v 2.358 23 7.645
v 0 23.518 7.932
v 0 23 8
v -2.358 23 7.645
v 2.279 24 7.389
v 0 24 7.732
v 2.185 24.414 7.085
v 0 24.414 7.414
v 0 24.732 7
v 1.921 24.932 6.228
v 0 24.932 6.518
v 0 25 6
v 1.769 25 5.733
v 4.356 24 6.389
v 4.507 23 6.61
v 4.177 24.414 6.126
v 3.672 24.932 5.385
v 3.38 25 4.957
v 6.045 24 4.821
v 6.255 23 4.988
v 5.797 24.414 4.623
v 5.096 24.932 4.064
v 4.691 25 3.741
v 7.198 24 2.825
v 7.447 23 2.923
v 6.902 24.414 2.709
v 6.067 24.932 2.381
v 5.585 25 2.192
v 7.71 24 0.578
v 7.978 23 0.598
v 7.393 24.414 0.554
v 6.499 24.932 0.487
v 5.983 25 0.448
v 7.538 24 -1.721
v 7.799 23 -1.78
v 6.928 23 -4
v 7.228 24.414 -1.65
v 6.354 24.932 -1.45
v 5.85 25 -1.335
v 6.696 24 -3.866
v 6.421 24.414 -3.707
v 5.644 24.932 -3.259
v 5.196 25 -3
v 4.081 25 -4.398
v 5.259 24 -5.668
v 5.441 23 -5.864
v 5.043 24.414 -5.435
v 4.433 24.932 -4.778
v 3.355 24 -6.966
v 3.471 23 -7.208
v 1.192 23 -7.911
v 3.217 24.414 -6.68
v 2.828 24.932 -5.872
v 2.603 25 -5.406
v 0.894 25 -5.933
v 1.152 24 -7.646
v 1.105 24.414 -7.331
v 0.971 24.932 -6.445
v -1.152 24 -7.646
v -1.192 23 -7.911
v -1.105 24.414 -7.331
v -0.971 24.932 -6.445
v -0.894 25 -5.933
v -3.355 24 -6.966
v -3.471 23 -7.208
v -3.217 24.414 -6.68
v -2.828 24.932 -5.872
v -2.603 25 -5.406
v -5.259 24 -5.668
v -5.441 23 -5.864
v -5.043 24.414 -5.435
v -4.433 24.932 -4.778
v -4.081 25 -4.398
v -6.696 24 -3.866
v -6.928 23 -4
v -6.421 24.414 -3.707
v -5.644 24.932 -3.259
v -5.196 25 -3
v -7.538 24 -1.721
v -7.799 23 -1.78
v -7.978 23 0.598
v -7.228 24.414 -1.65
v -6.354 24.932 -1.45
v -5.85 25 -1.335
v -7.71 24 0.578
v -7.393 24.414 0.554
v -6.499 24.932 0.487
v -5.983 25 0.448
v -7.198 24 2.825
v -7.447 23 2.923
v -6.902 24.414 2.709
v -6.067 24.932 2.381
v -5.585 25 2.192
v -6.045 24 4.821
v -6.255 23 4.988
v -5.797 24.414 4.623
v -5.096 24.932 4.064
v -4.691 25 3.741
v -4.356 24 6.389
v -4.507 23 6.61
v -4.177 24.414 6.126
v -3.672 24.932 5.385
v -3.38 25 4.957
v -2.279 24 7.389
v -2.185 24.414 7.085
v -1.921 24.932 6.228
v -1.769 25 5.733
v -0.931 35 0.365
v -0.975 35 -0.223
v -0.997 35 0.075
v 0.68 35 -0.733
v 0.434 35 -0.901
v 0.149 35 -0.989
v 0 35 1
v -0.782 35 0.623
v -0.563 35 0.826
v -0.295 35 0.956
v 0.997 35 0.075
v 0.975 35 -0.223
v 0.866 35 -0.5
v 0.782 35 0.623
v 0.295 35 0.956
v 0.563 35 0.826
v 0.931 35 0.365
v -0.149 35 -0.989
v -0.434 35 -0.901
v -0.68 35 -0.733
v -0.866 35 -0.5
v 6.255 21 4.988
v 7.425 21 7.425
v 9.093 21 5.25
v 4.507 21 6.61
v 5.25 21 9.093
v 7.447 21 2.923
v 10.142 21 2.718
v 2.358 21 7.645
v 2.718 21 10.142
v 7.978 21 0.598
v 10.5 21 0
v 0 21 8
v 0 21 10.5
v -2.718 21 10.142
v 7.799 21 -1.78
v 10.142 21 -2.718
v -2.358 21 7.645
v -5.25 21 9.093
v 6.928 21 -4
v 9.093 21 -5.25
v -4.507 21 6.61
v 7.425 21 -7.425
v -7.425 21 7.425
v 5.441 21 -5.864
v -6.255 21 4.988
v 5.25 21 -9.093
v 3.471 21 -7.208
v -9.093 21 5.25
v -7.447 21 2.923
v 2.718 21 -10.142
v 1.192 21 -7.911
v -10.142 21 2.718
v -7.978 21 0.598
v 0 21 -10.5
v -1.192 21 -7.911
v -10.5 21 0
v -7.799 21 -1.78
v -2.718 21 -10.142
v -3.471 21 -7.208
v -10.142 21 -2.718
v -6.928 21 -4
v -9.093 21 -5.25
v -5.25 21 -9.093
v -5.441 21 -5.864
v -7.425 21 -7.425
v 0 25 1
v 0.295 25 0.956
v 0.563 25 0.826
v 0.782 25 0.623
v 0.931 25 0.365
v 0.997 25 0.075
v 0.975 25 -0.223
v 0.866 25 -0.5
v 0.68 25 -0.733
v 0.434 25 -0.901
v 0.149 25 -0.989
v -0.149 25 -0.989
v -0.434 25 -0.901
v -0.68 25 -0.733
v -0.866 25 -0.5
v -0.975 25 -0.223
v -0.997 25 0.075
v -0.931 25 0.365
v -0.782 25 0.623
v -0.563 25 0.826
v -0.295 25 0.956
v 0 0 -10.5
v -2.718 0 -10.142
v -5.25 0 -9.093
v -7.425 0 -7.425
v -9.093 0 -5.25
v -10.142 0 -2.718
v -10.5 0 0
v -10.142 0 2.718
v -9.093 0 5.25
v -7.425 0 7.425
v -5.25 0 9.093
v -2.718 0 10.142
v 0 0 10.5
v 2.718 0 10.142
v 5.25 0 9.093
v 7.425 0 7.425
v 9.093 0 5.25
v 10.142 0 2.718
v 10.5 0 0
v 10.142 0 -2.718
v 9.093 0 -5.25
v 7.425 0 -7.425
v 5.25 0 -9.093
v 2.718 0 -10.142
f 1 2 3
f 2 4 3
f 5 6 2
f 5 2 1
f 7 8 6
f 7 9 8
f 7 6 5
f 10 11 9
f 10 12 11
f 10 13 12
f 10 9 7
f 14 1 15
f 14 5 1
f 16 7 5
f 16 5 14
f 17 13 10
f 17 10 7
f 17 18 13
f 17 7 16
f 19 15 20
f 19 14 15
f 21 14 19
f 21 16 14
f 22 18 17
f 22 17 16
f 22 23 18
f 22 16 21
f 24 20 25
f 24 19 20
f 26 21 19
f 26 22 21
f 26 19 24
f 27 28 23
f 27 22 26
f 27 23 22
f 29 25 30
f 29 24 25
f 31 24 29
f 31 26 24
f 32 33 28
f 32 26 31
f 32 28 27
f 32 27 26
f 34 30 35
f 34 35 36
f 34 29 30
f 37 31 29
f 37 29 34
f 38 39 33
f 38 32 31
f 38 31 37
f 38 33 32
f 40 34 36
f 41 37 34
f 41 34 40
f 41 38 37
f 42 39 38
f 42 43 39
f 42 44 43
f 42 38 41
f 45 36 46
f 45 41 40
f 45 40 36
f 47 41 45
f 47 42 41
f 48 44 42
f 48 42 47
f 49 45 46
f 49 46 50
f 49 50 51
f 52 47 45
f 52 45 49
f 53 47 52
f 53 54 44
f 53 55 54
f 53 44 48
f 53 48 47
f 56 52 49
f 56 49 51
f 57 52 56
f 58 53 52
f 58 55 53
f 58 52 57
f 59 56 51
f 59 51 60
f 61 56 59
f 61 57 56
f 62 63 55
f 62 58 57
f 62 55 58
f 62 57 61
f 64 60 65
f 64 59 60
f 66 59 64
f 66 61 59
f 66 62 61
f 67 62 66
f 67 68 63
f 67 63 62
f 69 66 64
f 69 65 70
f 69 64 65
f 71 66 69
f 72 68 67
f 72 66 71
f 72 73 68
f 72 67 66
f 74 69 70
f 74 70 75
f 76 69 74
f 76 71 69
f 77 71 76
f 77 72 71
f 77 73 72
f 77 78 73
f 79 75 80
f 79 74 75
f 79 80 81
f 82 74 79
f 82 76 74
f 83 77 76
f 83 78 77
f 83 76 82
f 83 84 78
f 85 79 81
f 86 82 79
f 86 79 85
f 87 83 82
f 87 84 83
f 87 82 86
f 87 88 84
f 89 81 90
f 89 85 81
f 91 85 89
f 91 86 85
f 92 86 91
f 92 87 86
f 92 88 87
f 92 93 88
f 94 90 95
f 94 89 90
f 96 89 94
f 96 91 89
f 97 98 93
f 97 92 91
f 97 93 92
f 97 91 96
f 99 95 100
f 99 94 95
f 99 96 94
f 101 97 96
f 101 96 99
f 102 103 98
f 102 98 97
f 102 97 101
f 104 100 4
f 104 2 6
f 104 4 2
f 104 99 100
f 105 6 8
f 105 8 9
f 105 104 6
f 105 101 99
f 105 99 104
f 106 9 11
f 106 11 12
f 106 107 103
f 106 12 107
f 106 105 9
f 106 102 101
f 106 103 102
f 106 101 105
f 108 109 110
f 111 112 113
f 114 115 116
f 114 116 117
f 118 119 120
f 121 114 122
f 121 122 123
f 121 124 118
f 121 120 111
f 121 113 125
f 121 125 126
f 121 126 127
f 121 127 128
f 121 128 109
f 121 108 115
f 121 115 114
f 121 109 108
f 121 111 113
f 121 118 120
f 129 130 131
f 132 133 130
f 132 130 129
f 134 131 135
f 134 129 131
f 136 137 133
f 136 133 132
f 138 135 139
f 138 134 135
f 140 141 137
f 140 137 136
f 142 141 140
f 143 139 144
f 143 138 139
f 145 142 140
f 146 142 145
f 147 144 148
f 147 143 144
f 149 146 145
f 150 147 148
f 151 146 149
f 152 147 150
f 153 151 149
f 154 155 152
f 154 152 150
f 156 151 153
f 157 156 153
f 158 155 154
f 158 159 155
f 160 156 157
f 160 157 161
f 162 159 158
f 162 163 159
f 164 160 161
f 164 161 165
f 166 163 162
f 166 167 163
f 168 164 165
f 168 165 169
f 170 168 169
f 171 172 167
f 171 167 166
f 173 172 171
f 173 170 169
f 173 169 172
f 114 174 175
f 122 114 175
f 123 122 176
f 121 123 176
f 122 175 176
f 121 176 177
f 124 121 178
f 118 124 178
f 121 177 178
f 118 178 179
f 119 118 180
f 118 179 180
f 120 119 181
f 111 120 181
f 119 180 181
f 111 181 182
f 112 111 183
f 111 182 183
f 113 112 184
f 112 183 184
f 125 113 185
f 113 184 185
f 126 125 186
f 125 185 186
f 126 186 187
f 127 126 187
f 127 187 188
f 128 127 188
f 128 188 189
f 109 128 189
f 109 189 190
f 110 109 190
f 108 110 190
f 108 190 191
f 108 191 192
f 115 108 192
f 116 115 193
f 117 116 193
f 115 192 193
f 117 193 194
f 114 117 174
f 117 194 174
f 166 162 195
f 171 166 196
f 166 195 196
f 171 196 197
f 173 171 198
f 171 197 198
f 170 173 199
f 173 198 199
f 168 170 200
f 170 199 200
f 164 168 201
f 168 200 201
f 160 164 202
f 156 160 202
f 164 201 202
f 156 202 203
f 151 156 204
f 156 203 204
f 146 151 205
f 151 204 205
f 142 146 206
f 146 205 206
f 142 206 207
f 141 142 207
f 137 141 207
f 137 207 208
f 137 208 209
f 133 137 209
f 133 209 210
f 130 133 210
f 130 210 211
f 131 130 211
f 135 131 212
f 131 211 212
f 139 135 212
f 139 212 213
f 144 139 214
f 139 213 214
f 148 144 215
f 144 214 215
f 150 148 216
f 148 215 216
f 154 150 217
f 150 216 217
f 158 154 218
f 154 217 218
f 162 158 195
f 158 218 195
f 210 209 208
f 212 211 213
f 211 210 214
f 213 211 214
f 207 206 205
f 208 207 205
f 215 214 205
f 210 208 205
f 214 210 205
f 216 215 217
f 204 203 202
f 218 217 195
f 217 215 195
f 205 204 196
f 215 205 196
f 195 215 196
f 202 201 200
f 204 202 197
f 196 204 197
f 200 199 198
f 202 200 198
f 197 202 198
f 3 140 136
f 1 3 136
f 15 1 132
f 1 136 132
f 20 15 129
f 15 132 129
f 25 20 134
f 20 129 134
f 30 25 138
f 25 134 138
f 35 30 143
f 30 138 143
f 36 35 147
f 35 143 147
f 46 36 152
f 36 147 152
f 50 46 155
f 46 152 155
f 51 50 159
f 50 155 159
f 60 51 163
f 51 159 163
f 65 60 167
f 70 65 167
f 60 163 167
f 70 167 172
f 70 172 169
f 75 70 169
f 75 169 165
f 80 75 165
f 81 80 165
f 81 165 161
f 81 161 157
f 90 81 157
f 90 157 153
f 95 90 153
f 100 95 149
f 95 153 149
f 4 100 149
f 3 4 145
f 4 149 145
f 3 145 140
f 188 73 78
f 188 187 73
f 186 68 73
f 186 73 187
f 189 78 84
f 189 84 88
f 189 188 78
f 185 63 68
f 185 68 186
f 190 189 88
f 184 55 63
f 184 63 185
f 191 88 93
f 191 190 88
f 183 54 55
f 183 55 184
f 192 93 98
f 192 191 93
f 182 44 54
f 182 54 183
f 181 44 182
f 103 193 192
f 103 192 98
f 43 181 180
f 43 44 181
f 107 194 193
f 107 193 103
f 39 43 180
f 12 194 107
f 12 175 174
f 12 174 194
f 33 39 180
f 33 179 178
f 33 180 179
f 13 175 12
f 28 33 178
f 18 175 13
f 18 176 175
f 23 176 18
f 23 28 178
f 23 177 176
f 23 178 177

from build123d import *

# Parameters (mm, degrees)
SKETCH_1_R      = 10.5
EXTRUDE_1_DEPTH = 21
SKETCH_2_R      = 8
EXTRUDE_2_DEPTH = 4
FILLET_1_R      = 2
SKETCH_3_R      = 1
EXTRUDE_3_DEPTH = 10


with BuildPart() as part:
    # 草圖1 → 填料-伸長1 (new body)
    with BuildSketch(Plane(origin=(0, 0, 0), x_dir=(1, 0, 0), z_dir=(0, 1, 0))):
        with Locations(Location((0, 0, 0), (0, 0, 90))):
            Circle(SKETCH_1_R)
    extrude(amount=EXTRUDE_1_DEPTH)

    # 草圖2 → 填料-伸長2 (add)
    with BuildSketch(Plane(origin=(0, 21, 0), x_dir=(1, 0, 0), z_dir=(0, 1, 0))):
        with Locations(Location((0, 0, 0), (0, 0, 270))):
            Circle(SKETCH_2_R)
    extrude(amount=EXTRUDE_2_DEPTH)

    # 圓角1
    fillet_1_edges = [part.edges().sort_by_distance(p)[0] for p in [
        (0, 25, -8),
    ]]
    fillet(fillet_1_edges, radius=FILLET_1_R)

    # 草圖3 → 填料-伸長3 (add)
    with BuildSketch(Plane(origin=(0, 25, 0), x_dir=(1, 0, 0), z_dir=(0, 1, 0))):
        with Locations(Location((0, 0, 0), (0, 0, 270))):
            Circle(SKETCH_3_R)
    extrude(amount=EXTRUDE_3_DEPTH)


solid = part.part
